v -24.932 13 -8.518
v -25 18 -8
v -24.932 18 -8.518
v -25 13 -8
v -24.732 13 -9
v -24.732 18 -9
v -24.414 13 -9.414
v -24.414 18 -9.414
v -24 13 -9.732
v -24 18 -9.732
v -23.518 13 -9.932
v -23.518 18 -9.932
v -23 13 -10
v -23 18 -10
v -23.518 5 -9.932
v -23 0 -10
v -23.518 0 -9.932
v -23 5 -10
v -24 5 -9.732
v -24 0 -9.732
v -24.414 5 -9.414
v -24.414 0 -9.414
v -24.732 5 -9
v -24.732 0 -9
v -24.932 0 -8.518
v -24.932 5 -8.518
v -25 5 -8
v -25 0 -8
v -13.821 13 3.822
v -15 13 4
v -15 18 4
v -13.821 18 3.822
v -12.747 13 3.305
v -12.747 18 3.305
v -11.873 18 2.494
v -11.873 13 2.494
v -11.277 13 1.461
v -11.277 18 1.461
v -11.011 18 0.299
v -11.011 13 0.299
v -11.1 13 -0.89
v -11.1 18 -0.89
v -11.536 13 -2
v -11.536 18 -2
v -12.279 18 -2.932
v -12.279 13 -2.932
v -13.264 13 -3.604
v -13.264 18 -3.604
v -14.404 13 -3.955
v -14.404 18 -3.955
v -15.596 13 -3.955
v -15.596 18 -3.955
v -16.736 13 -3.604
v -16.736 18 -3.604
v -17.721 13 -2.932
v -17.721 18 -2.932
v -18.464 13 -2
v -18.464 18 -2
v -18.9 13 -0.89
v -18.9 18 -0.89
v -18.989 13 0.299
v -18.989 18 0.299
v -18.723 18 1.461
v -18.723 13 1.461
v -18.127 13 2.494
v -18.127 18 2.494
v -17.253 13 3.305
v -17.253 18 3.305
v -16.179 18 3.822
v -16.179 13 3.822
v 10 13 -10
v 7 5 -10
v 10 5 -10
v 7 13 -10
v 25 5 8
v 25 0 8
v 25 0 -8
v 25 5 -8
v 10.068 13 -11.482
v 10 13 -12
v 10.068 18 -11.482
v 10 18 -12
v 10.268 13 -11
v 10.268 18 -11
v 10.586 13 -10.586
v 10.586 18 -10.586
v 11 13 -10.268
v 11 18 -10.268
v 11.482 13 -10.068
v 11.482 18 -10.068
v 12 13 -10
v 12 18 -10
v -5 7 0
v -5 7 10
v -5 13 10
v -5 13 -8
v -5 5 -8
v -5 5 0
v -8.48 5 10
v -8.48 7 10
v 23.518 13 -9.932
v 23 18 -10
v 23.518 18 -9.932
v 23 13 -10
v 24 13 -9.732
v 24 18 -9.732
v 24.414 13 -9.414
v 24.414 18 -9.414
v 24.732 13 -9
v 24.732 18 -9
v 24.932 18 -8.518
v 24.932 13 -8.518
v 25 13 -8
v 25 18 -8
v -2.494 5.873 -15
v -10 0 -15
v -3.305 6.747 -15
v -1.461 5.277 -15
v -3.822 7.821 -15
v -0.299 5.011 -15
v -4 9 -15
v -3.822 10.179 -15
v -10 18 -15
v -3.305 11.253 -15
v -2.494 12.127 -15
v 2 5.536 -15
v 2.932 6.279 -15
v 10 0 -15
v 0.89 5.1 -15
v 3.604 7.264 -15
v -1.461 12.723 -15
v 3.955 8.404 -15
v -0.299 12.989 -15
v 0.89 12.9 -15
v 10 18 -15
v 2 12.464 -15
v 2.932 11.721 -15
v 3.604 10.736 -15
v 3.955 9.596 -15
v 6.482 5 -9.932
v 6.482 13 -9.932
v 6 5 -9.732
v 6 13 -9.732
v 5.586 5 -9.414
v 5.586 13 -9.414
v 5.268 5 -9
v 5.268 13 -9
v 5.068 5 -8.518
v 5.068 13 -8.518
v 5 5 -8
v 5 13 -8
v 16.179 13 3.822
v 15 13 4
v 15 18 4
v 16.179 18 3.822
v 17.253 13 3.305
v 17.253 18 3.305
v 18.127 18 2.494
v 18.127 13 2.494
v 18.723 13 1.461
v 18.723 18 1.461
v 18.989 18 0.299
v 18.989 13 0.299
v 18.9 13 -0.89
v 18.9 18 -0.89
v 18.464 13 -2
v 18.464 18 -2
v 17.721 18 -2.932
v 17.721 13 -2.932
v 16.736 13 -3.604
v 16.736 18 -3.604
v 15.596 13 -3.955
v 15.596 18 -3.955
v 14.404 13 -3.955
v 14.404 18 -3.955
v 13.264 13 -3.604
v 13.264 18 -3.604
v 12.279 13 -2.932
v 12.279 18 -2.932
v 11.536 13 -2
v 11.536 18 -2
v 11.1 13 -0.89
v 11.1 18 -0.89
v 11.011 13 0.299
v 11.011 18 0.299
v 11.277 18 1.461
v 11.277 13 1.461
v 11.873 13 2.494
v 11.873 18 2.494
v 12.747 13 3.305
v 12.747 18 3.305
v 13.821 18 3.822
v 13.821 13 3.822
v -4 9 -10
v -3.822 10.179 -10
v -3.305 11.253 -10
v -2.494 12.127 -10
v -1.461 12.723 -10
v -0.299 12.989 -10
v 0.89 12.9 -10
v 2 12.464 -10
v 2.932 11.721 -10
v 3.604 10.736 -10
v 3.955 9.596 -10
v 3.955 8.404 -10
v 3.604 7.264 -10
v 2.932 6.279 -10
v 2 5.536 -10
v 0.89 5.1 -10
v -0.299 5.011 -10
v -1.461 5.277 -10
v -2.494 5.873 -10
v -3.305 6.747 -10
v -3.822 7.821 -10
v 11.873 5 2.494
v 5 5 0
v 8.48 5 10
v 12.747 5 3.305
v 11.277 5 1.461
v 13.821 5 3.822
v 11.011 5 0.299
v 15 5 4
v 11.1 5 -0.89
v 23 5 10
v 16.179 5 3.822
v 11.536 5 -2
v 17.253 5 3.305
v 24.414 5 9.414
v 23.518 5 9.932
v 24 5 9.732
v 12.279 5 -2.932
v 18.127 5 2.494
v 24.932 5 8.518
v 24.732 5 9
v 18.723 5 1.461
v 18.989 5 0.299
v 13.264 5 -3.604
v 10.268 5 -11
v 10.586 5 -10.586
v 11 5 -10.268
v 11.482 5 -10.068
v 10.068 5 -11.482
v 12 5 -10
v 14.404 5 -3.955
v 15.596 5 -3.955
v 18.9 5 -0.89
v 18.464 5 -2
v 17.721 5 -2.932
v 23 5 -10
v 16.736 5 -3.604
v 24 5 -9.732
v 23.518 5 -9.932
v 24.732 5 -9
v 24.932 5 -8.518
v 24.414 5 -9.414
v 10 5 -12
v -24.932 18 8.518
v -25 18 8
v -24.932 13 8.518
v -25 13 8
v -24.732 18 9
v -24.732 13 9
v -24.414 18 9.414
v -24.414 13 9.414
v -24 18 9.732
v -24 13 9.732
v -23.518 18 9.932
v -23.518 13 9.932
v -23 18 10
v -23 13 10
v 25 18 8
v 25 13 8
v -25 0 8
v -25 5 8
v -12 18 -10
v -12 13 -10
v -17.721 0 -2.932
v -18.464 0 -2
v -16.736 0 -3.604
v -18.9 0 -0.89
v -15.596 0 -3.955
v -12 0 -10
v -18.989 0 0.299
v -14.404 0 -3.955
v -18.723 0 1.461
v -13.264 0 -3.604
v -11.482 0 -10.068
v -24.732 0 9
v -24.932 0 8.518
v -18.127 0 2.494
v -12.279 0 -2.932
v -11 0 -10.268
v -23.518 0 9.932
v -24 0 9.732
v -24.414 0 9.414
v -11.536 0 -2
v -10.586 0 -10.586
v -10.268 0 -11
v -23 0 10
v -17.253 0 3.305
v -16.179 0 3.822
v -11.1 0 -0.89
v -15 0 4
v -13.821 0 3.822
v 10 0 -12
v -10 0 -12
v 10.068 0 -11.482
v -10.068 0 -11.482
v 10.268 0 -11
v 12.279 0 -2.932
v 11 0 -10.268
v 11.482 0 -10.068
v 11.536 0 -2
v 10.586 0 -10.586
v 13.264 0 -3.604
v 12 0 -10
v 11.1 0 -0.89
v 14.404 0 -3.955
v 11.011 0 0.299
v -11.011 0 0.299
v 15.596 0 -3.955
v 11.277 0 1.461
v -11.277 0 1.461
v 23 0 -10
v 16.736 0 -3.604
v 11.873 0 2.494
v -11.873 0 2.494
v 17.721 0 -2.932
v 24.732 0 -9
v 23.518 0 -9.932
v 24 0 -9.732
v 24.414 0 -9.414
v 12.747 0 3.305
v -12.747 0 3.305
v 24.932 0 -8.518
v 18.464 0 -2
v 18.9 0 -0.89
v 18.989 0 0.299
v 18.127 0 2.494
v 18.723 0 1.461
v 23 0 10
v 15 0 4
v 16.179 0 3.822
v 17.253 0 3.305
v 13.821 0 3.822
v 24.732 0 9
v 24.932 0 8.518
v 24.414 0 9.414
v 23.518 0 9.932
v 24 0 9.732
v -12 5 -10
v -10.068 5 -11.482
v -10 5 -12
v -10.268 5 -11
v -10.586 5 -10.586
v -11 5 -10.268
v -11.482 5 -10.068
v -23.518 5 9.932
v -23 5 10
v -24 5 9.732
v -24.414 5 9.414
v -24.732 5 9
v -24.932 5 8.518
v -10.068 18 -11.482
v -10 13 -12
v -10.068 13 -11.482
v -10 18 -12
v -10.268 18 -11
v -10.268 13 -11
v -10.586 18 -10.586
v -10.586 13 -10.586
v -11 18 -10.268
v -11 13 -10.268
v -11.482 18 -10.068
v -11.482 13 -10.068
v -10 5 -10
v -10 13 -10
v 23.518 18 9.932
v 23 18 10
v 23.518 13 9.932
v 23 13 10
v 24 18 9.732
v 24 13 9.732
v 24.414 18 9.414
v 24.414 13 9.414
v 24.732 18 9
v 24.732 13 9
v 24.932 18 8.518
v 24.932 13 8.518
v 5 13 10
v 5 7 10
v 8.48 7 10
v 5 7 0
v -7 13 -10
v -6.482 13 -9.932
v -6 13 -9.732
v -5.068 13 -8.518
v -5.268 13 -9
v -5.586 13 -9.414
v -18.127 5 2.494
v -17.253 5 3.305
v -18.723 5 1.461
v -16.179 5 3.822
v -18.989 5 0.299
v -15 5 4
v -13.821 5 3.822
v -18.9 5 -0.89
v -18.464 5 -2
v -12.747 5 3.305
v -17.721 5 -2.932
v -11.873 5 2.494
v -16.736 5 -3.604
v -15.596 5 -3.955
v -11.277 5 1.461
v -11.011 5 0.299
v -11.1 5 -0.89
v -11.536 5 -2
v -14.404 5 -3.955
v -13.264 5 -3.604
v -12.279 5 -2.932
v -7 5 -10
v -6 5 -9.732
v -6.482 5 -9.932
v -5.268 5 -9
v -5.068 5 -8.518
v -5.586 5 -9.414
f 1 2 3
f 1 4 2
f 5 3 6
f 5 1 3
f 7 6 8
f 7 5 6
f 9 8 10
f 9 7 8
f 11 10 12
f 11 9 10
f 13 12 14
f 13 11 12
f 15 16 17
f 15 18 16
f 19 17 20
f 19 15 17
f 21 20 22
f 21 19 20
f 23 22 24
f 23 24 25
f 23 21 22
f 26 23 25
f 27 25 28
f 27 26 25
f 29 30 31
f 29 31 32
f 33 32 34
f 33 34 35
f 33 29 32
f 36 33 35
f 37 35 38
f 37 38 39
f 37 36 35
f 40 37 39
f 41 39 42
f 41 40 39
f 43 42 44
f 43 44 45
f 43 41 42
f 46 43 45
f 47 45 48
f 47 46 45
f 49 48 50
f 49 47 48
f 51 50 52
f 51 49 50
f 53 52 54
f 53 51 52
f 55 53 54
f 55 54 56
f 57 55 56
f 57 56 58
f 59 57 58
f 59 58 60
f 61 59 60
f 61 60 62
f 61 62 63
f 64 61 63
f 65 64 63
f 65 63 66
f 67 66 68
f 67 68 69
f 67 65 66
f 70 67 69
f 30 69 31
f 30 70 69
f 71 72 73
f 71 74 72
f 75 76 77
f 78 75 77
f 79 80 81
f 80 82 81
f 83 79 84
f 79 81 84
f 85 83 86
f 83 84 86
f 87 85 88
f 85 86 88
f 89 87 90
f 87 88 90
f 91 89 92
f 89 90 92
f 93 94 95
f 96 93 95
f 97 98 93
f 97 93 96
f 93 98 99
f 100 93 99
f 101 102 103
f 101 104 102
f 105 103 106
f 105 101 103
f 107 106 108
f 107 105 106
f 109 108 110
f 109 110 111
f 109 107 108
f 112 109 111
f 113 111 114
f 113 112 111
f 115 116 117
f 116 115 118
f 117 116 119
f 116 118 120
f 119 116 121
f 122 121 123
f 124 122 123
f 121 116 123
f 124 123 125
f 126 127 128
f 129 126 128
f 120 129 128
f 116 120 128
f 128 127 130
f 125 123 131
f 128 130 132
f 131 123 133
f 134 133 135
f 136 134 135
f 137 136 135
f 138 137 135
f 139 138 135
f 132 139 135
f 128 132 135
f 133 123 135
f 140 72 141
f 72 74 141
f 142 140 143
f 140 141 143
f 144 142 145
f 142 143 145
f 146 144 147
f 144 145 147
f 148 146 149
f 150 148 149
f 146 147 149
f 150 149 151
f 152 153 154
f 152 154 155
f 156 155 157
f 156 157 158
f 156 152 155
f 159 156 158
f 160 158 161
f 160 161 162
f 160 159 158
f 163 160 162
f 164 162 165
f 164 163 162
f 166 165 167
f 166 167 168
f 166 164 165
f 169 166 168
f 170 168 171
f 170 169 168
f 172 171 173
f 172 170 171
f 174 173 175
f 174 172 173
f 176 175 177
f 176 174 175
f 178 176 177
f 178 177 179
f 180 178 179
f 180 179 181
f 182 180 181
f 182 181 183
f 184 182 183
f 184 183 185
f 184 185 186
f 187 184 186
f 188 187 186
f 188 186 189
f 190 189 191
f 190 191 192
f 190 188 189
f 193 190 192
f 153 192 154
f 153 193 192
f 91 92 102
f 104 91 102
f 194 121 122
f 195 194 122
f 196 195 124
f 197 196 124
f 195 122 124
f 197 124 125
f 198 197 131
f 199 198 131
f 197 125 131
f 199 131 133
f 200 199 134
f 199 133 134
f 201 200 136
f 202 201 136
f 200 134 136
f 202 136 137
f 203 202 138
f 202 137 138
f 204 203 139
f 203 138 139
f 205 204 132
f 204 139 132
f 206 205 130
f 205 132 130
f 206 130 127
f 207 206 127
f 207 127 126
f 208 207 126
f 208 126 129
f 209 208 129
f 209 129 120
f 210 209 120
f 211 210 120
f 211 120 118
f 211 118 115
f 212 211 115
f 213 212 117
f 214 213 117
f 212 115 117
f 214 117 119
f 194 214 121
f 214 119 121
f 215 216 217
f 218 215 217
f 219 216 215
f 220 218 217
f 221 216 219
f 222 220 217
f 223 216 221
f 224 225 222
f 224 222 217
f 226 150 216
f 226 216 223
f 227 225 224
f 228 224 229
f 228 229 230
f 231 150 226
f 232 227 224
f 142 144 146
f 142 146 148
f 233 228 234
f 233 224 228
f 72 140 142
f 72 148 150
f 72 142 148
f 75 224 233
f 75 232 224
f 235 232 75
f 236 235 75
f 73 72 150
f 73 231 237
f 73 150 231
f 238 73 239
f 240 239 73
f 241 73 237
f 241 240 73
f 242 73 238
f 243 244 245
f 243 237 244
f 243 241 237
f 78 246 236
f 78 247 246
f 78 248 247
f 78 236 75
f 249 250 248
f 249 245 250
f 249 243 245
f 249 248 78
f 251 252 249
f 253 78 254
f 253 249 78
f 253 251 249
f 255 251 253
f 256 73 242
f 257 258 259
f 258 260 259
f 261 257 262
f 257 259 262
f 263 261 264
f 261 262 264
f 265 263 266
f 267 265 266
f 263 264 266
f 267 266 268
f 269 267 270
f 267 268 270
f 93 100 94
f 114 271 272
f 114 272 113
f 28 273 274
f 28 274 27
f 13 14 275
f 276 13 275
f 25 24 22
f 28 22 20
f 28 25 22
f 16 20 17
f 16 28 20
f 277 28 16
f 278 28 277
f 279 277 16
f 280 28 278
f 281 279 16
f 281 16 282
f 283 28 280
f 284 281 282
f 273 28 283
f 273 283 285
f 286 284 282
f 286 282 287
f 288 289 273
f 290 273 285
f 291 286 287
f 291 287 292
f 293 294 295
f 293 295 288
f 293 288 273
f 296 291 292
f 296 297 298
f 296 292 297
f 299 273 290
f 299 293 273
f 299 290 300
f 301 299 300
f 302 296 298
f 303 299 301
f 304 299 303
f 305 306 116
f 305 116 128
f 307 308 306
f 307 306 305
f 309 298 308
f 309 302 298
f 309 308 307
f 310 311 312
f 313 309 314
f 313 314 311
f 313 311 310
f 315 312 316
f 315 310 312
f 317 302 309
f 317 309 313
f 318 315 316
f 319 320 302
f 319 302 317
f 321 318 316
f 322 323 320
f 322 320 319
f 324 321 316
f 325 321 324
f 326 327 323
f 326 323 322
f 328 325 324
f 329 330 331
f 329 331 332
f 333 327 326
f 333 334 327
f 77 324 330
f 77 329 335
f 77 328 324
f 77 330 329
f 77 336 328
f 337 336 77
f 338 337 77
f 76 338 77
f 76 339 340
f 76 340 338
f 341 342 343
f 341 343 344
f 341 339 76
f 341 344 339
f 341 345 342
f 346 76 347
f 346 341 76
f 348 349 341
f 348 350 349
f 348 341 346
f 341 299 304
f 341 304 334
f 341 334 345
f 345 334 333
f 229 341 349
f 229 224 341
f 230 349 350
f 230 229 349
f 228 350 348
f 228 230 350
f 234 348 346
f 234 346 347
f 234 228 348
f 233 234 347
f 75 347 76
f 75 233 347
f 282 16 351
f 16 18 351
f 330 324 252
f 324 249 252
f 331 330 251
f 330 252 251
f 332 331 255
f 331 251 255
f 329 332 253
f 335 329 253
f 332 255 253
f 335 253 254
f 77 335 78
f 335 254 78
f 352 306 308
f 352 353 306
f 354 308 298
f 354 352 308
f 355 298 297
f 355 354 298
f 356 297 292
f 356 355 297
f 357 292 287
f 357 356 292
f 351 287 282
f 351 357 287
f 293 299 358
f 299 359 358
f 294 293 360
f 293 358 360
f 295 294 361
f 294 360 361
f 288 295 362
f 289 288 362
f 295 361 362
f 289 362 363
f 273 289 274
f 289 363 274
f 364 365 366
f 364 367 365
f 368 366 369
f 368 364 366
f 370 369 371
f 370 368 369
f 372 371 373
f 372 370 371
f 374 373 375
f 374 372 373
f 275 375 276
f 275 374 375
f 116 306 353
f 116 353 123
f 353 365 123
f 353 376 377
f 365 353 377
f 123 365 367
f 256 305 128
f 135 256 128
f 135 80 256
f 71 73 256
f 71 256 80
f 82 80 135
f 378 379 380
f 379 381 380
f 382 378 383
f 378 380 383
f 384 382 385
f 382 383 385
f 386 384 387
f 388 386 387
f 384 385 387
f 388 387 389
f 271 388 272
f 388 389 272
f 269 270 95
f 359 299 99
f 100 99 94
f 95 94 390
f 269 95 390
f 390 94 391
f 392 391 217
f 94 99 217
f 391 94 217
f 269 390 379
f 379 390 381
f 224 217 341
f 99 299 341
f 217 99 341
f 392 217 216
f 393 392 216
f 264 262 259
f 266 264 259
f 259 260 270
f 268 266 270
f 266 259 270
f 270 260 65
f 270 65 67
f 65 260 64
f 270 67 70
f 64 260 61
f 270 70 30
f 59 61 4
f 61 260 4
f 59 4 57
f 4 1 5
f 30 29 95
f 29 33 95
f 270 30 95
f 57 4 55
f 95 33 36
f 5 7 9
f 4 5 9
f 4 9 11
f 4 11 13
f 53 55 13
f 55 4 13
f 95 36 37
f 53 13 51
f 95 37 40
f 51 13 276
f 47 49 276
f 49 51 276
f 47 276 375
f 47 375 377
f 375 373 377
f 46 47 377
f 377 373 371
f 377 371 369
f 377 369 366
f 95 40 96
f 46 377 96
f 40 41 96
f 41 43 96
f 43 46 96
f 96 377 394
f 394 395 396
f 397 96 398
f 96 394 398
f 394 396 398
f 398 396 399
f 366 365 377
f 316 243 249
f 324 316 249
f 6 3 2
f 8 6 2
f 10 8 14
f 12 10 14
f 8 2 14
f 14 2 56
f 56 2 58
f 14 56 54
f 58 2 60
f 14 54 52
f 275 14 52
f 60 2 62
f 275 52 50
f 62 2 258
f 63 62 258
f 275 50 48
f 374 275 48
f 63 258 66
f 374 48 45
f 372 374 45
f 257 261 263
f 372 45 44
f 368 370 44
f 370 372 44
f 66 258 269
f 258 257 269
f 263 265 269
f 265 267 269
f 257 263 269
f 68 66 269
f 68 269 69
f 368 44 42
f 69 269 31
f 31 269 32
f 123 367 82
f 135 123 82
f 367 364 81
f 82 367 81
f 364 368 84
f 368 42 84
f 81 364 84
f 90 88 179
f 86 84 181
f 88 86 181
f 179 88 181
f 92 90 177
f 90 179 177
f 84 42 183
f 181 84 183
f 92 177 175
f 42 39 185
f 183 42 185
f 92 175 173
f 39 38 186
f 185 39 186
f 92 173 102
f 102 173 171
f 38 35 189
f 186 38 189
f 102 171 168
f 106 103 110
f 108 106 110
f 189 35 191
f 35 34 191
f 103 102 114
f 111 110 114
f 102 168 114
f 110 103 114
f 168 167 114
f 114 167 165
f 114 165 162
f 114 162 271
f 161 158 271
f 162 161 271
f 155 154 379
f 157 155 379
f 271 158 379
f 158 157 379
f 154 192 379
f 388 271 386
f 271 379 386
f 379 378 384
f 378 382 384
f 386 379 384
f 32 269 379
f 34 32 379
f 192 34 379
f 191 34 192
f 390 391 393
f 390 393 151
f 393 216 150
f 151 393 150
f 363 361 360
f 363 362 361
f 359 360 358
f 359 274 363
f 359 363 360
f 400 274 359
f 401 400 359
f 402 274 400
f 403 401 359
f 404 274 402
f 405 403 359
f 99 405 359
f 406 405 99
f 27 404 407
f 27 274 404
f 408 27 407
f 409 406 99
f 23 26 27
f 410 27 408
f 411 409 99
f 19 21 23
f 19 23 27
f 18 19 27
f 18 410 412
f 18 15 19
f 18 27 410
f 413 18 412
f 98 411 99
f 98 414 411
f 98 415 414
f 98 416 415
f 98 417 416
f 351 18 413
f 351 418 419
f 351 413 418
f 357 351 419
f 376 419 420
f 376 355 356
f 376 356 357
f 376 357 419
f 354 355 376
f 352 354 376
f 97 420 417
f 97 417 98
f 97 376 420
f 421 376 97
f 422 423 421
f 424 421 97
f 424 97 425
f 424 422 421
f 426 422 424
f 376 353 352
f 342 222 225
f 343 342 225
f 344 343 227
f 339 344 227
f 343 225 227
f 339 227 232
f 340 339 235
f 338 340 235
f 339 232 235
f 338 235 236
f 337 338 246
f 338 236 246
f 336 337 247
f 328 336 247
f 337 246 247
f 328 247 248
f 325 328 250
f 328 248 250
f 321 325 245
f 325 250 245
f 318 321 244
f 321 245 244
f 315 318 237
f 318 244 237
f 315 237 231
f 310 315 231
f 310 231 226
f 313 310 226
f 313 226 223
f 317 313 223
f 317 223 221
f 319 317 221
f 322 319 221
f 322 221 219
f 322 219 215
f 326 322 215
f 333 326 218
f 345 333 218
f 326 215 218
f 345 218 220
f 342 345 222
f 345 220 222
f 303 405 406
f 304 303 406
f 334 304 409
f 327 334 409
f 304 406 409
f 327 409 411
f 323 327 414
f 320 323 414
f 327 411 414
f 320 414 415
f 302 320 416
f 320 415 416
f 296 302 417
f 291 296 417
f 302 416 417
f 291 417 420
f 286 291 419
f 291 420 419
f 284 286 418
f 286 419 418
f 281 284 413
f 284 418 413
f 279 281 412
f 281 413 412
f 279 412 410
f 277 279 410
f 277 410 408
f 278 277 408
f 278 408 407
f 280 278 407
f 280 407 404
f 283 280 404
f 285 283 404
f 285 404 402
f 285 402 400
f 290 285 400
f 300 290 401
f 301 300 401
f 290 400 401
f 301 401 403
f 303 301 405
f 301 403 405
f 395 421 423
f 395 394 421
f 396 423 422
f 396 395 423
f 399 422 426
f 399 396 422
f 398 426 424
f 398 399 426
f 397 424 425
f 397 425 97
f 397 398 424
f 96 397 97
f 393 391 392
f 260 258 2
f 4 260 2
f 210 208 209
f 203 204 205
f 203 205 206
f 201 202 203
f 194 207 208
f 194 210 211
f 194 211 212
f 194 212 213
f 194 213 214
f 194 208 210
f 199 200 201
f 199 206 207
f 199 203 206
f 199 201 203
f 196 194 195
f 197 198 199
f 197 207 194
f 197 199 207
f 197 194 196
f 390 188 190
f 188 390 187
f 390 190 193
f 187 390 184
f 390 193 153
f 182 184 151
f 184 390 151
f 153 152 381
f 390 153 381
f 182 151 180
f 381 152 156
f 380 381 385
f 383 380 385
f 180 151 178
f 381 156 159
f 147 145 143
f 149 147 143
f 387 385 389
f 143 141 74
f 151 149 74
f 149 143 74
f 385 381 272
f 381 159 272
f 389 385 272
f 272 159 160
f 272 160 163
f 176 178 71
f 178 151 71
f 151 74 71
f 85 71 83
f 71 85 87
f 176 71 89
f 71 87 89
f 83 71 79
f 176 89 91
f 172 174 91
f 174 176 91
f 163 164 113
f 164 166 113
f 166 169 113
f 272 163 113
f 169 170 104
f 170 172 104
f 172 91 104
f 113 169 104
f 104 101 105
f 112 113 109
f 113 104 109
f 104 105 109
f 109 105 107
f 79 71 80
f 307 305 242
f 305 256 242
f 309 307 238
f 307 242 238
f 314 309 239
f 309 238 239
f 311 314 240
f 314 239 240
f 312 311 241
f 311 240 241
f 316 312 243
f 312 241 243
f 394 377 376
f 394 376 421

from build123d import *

# Parameters (mm, degrees)
SKETCH1_W           = 50
SKETCH1_H           = 20
BOSS_EXTRUDE1_DEPTH = 5
SKETCH2_R           = 4
CUT_EXTRUDE1_DEPTH  = 5
SKETCH3_W           = 10
SKETCH3_H           = 20
BOSS_EXTRUDE2_DEPTH = 8
FILLET1_R           = 2
SKETCH5_W           = 20
SKETCH5_H           = 18
BOSS_EXTRUDE3_DEPTH = 5
SKETCH6_R           = 4
CUT_EXTRUDE2_DEPTH  = 5
FILLET2_R           = 2
BOSS_EXTRUDE4_DEPTH = 2


with BuildPart() as part:
    # Sketch1 → Boss-Extrude1 (new body)
    with BuildSketch(Plane(origin=(0, 0, 0), x_dir=(1, 0, 0), z_dir=(0, 1, 0))):
        Rectangle(SKETCH1_W, SKETCH1_H)
    boss_extrude1 = extrude(amount=BOSS_EXTRUDE1_DEPTH)

    # Sketch2 → Cut-Extrude1 (cut)
    with BuildSketch(Plane(origin=(0, 5, 0), x_dir=(1, 0, 0), z_dir=(0, 1, 0))):
        with Locations((-15, 0)):
            Circle(SKETCH2_R)
        with Locations((15, 0)):
            Circle(SKETCH2_R)
    cut_extrude1 = extrude(amount=-CUT_EXTRUDE1_DEPTH, mode=Mode.SUBTRACT)

    # Sketch3 → Boss-Extrude2 (add)
    with BuildSketch(Plane(origin=(0, 5, 0), x_dir=(1, 0, 0), z_dir=(0, 1, 0))):
        Rectangle(SKETCH3_W, SKETCH3_H)
    extrude(amount=BOSS_EXTRUDE2_DEPTH)

    # Mirror1: Boss-Extrude1, Cut-Extrude1 across plane
    add(boss_extrude1.mirror(Plane.ZX.offset(9)))
    add(cut_extrude1.mirror(Plane.ZX.offset(9)), mode=Mode.SUBTRACT)

    # Fillet1
    fillet1_edges = [part.edges().sort_by_distance(p)[0] for p in [
        (25, 2.5, -10),
        (25, 15.5, -10),
        (25, 15.5, 10),
        (25, 2.5, 10),
        (-25, 15.5, -10),
        (-25, 15.5, 10),
        (-25, 2.5, 10),
        (-25, 2.5, -10),
    ]]
    fillet(fillet1_edges, radius=FILLET1_R)

    # Sketch5 → Boss-Extrude3 (add)
    with BuildSketch(Plane.XY.offset(-10)):
        with Locations((0, 9)):
            Rectangle(SKETCH5_W, SKETCH5_H)
    extrude(amount=-BOSS_EXTRUDE3_DEPTH)

    # Sketch6 → Cut-Extrude2 (cut)
    with BuildSketch(Plane(origin=(0, 0, -15), x_dir=(-1, 0, 0), z_dir=(0, 0, -1))):
        with Locations((0, 9)):
            Circle(SKETCH6_R)
    extrude(amount=-CUT_EXTRUDE2_DEPTH, mode=Mode.SUBTRACT)

    # Fillet2
    fillet2_edges = [part.edges().sort_by_distance(p)[0] for p in [
        (10, 2.5, -10),
        (10, 15.5, -10),
        (5, 9, -10),
        (-5, 9, -10),
        (-10, 2.5, -10),
        (-10, 15.5, -10),
    ]]
    fillet(fillet2_edges, radius=FILLET2_R)

    # Sketch2<5> → Boss-Extrude4 (add)
    with BuildSketch(Plane(origin=(0, 5, 0), x_dir=(1, 0, 0), z_dir=(0, 1, 0))):
        Polygon((-5, -10), (-5, 0), (-8.48, -10), align=None)
        Polygon((5, 0), (5, -10), (8.48, -10), align=None)
    extrude(amount=BOSS_EXTRUDE4_DEPTH)


solid = part.part
